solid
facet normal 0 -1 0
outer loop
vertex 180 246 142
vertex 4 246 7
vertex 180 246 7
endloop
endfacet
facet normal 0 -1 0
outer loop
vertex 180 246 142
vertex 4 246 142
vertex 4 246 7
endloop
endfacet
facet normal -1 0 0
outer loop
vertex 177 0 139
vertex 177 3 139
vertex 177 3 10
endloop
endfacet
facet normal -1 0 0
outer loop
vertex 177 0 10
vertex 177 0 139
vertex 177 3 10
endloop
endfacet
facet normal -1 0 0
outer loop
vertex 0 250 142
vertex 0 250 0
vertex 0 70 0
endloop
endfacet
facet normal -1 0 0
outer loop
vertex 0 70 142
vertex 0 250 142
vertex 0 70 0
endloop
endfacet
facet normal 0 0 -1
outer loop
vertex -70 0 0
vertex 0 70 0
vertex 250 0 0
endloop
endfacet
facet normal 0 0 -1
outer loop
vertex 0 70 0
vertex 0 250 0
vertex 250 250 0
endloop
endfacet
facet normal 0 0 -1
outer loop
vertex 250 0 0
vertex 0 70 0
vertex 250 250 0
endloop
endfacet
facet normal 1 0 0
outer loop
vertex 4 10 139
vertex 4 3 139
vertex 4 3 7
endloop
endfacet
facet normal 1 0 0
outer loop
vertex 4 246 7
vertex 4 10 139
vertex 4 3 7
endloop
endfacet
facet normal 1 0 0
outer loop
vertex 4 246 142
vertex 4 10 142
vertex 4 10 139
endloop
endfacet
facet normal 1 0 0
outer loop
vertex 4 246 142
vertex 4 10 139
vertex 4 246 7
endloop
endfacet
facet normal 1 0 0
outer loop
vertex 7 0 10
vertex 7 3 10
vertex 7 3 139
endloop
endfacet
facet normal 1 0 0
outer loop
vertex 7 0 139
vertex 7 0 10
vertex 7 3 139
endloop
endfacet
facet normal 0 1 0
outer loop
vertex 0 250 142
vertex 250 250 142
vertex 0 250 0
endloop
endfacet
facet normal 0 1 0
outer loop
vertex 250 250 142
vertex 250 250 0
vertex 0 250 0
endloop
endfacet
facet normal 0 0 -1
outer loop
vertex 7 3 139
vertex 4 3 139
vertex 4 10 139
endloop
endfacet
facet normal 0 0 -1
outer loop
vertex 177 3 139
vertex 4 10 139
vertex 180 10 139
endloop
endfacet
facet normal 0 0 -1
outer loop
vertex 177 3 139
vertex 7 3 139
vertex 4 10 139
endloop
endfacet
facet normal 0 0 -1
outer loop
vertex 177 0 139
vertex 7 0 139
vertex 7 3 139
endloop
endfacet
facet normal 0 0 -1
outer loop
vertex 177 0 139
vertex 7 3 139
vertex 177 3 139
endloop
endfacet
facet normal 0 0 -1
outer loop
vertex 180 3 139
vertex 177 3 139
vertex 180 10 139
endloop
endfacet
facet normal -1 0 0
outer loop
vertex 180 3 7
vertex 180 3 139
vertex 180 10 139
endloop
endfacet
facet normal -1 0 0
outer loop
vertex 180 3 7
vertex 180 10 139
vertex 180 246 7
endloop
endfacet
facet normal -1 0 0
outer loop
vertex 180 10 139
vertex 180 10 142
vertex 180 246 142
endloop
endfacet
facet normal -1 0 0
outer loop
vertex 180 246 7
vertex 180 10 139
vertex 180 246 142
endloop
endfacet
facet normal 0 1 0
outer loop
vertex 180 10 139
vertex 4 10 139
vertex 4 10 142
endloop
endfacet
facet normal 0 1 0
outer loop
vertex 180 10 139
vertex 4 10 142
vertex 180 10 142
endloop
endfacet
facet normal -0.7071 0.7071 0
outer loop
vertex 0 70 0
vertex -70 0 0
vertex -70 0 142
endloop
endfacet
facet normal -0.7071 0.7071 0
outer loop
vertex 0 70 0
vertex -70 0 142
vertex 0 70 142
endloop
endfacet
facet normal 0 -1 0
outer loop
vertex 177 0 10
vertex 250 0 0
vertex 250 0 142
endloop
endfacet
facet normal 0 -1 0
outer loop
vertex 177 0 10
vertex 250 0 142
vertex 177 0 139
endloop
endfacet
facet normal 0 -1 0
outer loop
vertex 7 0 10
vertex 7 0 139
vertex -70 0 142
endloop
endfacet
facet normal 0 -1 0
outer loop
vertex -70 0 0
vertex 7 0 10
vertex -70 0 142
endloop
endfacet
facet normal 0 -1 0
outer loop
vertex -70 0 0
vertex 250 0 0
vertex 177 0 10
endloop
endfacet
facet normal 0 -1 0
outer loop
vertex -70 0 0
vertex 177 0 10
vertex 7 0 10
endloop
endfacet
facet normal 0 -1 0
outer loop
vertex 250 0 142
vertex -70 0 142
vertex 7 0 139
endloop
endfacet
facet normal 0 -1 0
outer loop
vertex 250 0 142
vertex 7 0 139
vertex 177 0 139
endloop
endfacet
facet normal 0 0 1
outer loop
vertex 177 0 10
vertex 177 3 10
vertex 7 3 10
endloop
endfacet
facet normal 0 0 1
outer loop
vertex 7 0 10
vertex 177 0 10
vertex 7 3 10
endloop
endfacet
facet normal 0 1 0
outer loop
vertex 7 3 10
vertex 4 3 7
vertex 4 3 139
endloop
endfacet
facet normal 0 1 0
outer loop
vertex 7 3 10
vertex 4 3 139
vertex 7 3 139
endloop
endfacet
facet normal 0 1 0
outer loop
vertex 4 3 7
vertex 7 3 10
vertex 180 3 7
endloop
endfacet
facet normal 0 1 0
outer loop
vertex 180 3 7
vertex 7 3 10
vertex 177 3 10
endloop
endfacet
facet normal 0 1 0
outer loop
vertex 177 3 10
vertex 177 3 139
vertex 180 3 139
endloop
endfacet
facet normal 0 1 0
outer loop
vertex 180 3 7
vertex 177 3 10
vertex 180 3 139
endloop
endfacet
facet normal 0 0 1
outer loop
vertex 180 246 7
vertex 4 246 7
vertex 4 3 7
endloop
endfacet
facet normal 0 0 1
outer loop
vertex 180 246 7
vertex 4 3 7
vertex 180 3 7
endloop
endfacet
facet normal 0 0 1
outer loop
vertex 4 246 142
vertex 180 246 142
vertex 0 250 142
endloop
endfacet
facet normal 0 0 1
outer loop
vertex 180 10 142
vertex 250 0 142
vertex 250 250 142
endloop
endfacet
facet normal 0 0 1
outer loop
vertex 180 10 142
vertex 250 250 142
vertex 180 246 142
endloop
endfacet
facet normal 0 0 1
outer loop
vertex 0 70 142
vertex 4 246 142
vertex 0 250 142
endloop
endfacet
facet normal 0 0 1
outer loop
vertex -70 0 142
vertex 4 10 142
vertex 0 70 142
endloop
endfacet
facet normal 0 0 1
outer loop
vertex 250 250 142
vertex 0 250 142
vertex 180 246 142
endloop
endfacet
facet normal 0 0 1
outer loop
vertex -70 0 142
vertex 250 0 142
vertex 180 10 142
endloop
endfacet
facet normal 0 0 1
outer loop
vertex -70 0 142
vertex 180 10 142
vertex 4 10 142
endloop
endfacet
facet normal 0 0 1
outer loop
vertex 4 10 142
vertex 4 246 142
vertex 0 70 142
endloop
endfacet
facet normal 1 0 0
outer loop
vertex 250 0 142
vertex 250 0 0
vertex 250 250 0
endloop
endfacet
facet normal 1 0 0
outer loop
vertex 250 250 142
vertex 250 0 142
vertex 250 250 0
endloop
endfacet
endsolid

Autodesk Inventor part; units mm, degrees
ref_plane "YZ Plane" through (0, 0, 0) normal (1, 0, 0) x (0, 1, 0)
ref_plane "XZ Plane" through (0, 0, 0) normal (0, 1, 0) x (-1, 0, 0)
ref_plane "XY Plane" through (0, 0, 0) normal (0, 0, 1) x (1, 0, 0)
sketch "Sketch1" plane through (0, 0, 0) normal (0, 0, 1) x (1, 0, 0)
  point P0 (0, 0)
sketch "Sketch2" plane through (0, 0, 0) normal (0, 0, 1) x (1, 0, 0)
  line L0 (0, 0) -> (250, 0)
  line L1 (250, 0) -> (250, 250)
  line L2 (250, 250) -> (0, 250)
  line L3 (0, 250) -> (0, 0)
  line L4 (0, 0) -> (-70, 0)
  line L5 (-70, 0) -> (0, 70)
  dimension "d0" = 250
  dimension "d1" = 250
  dimension "d2" = 70
  dimension "d3" = 45
extrude "Extrusion1" add sketch "Sketch2" along normal blind 142
sketch "Sketch3" plane through (0, 0, 142) normal (0, 0, 1) x (1, 0, 0)
  line L0 (4, 3) -> (180, 3)
  line L1 (-70, 0) -> (250, 0) projected
  line L2 (4, 3) -> (180, 3) construction
  line L3 (180, 3) -> (180, 246)
  line L4 (4, 3) -> (4, 246)
  line L5 (4, 3) -> (247, 3) construction
  line L6 (250, 250) -> (0, 250) projected
  line L7 (4, 246) -> (180, 246)
  point P0 (0, 0)
  dimension "d6" = 176
  dimension "d7" = 0
  dimension "d8" = 243
  dimension "d9" = 243
  dimension "d10" = 90
extrude "Extrusion2" cut sketch "Sketch3" against normal blind 135
sketch "Sketch4" plane through (4, 3, 142) normal (0, 1, 0) x (1, 0, 0)
  line L0 (3, 3) -> (173, 3)
  line L1 (176, 0) -> (0, 0) projected
  line L2 (173, 3) -> (173, 132)
  line L3 (173, 132) -> (3, 132)
  line L4 (176, 135) -> (0, 135) projected
  line L5 (3, 132) -> (3, 3)
  line L6 (176, 0) -> (176, 135) projected
  line L7 (0, 0) -> (0, 135) projected
  point P0 (-4, 142)
  dimension "d13" = 3
  dimension "d14" = 3
  dimension "d15" = 3
  dimension "d16" = 3
extrude "Extrusion3" cut sketch "Sketch4" against normal through all contours L5 L3 L2 L0
sketch "Sketch5" plane through (4, 3, 142) normal (0, 1, 0) x (1, 0, 0)
  line L0 (176, 0) -> (0, 0) projected
  line L1 (0, 0) -> (0, 3)
  line L2 (3, 3) -> (3, 132) projected
  line L3 (0, 3) -> (176, 3)
  line L4 (176, 0) -> (176, 135) projected
  line L5 (176, 0) -> (0, 0)
  line L6 (3, 3) -> (173, 3) projected
  point P0 (-4, 142)
extrude "Extrusion4" add sketch "Sketch5" along normal blind 7
